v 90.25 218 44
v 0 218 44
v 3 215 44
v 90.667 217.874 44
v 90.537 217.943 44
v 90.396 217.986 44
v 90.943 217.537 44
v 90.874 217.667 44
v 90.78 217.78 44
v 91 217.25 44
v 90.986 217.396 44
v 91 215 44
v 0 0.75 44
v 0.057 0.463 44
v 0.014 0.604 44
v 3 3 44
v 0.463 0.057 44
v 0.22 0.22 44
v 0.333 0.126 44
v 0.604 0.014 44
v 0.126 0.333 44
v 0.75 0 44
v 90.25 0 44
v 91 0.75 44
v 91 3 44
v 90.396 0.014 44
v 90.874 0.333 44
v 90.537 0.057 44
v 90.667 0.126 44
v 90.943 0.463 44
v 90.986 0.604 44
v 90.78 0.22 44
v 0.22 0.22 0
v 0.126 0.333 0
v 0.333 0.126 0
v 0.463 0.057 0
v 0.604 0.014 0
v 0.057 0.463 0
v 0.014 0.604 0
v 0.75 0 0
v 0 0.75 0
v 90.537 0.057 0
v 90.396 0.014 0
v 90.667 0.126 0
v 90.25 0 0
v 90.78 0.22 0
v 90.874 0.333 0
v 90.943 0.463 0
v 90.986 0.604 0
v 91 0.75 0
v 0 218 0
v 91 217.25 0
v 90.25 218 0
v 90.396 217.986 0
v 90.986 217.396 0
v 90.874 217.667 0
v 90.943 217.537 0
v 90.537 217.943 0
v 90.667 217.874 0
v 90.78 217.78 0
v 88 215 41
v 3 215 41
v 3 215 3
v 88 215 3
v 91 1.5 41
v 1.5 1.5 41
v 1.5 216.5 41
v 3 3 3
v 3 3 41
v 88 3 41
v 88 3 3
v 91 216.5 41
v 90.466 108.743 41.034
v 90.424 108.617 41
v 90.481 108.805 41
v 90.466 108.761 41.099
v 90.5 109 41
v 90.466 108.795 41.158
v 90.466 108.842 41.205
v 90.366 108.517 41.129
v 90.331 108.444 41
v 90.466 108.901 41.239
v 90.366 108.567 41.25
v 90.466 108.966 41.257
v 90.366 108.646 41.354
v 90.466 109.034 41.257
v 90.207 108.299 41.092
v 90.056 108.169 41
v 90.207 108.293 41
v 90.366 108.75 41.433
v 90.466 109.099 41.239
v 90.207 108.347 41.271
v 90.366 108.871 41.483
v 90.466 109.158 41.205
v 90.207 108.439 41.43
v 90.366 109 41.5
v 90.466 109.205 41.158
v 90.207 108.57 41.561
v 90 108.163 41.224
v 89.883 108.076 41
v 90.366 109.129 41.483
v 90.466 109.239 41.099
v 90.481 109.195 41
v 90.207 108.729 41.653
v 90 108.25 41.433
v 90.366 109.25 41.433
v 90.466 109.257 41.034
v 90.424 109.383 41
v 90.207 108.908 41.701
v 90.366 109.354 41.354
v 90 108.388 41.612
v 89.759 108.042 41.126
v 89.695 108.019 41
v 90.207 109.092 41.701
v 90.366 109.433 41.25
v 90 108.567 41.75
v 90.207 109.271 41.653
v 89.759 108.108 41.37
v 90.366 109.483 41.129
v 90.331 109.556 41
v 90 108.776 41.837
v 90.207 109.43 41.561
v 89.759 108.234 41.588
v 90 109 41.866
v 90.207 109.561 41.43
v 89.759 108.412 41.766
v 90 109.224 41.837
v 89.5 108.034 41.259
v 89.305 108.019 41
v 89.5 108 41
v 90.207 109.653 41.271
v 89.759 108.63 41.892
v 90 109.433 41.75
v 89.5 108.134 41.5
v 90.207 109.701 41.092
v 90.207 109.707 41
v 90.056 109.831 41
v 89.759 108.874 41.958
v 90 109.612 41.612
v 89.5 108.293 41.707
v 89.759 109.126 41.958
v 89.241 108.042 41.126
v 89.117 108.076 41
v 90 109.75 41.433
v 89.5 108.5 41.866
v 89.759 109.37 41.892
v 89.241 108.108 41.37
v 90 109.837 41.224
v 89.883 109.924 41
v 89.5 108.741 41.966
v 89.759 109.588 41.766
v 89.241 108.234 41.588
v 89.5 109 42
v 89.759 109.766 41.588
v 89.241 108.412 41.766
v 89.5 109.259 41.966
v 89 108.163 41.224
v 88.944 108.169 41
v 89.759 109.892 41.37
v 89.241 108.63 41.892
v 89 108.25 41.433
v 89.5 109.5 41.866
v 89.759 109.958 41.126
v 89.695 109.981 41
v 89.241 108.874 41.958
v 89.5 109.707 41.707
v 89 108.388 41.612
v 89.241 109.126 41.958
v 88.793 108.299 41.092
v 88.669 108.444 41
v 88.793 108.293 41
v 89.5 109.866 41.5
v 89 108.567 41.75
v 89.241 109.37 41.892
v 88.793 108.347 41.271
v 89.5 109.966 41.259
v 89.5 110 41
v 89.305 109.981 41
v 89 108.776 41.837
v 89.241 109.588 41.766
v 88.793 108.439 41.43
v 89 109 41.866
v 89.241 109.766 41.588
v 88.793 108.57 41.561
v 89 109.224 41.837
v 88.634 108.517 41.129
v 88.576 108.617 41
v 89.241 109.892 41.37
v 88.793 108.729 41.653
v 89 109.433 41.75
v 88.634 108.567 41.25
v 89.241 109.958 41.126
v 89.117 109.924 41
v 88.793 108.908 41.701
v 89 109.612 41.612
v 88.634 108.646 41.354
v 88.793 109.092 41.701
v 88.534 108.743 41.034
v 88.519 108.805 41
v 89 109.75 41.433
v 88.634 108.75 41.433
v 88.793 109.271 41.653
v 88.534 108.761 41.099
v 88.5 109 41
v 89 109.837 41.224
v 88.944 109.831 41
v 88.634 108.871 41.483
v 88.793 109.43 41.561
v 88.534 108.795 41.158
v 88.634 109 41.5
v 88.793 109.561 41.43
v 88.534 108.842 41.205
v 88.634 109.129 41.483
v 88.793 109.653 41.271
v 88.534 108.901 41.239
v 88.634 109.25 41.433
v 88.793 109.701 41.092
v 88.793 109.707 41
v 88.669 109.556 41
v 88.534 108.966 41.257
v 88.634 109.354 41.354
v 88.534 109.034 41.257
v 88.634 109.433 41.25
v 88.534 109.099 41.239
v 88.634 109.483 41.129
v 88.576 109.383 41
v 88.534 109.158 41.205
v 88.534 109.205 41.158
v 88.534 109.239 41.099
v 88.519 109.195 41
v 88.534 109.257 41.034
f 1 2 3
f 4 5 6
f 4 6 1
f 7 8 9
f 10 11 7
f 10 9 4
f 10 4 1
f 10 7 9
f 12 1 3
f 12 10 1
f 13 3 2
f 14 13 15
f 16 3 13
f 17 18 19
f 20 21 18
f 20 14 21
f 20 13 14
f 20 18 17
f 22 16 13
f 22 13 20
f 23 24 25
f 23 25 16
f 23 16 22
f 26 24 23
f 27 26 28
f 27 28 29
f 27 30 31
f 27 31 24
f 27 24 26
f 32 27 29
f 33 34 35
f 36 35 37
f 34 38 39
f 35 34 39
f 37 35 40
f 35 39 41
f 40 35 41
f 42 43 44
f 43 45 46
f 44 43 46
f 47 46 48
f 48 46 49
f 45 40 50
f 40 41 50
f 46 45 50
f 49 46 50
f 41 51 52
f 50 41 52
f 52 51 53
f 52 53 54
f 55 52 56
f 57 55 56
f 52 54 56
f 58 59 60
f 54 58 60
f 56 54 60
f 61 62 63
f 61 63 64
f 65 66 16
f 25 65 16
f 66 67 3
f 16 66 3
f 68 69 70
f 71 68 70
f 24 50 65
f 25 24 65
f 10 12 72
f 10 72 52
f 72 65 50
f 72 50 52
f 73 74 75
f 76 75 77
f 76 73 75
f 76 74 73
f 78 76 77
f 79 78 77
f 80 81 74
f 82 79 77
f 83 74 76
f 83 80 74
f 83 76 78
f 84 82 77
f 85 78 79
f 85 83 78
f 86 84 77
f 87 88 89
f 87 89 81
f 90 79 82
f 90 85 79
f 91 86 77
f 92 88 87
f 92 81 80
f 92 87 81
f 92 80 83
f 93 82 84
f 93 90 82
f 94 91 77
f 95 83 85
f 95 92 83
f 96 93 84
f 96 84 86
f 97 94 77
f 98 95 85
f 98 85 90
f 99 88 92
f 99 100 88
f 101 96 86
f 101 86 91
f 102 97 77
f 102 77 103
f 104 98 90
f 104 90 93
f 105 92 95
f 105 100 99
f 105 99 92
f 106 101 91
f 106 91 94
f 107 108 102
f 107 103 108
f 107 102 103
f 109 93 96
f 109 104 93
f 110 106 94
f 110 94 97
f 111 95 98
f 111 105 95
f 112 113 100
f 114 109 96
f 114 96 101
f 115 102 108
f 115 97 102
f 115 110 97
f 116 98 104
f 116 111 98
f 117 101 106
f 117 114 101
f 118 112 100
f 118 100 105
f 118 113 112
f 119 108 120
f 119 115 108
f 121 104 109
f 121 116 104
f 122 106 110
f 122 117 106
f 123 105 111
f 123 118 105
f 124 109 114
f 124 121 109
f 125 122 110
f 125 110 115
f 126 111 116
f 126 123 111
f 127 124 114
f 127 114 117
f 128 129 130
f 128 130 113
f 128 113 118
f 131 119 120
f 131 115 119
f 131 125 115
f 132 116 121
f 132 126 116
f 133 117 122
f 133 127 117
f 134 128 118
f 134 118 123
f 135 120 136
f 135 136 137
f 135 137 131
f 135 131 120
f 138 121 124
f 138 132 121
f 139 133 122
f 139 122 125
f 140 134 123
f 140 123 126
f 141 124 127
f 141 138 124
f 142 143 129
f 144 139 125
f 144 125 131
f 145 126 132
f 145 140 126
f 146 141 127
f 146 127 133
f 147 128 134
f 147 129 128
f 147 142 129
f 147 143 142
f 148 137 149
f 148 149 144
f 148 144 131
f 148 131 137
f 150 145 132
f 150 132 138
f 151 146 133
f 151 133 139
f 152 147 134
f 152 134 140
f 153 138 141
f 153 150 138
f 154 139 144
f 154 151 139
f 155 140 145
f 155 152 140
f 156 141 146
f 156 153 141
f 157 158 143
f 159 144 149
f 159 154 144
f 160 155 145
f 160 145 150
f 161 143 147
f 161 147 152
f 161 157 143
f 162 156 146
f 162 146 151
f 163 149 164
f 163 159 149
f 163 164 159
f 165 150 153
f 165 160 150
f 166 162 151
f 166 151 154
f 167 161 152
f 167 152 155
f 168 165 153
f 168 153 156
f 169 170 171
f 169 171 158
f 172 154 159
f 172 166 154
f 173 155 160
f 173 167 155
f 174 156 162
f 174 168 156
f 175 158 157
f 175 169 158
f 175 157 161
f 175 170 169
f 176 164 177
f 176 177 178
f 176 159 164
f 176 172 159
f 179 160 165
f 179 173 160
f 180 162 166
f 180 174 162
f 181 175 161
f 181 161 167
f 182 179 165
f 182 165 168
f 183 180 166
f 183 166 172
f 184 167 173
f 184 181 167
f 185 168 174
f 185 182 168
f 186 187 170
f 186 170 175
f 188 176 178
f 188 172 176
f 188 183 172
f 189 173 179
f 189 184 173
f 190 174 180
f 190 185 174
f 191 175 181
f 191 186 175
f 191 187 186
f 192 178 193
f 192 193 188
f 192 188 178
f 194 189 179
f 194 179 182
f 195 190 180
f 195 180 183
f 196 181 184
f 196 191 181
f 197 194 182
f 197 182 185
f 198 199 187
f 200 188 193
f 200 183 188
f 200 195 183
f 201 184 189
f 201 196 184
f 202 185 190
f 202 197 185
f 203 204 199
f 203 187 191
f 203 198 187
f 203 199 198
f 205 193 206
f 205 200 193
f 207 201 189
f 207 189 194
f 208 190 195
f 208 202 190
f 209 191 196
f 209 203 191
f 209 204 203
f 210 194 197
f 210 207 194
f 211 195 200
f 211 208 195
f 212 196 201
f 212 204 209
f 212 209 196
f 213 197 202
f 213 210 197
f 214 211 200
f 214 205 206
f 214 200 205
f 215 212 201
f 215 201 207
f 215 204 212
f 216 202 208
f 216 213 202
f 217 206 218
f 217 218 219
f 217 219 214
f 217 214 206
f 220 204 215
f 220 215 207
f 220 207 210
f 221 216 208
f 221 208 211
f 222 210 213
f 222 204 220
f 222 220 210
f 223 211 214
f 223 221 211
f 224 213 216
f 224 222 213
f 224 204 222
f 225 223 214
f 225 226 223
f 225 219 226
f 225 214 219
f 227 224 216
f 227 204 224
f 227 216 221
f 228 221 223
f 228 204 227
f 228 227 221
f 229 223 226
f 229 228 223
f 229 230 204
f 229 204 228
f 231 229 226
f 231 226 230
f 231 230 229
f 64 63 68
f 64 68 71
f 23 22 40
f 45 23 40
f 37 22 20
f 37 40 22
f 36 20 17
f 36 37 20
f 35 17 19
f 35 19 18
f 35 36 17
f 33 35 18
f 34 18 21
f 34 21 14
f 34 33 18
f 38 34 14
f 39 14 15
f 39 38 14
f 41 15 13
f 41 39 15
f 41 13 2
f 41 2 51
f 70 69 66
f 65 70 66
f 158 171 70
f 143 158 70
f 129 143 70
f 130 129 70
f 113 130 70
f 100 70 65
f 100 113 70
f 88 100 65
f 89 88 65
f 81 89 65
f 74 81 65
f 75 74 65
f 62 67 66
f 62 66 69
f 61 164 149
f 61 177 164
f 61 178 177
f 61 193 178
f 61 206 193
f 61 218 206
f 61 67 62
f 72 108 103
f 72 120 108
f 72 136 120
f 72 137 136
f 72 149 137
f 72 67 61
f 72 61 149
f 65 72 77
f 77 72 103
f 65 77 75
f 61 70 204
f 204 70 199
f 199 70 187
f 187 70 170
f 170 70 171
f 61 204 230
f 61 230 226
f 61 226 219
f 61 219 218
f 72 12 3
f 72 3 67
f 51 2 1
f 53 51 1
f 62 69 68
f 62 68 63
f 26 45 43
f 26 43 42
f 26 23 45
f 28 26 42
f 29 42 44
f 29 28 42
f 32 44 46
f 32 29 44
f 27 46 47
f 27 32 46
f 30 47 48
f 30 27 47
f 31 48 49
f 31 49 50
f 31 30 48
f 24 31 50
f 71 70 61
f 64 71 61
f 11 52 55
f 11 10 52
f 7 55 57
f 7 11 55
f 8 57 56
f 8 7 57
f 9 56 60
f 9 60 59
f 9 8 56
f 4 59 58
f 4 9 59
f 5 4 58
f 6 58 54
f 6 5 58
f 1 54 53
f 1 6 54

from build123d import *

# Parameters (mm, degrees)
F4_W      = 91
F4_H      = 218
F5_DEPTH  = 41
F8_DEPTH  = 218
F9_DEPTH  = 91
F10_W     = 85
F10_H     = 212
F11_DEPTH = 38
F12_R     = 0.75


with BuildPart() as f5:
    # F4 (on Top) → F5 (new body)
    with BuildSketch(Plane.XY):
        with Locations((45.5, 109)):
            Rectangle(F4_W, F4_H)
    extrude(amount=F5_DEPTH)

    # F7 (on face) → F8 (join)
    with BuildSketch(Plane.XZ):
        Polygon((0, 44), (0, 41), (1.5, 41), (3, 44), align=None)
    extrude(amount=-F8_DEPTH)

    # F6 (on face) → F9 (join)
    with BuildSketch(Plane.YZ.offset(91)):
        Polygon((0, 44), (0, 41), (1.5, 41), (3, 44), align=None)
        Polygon((216.5, 41), (218, 41), (218, 44), (215, 44), align=None)
    extrude(amount=-F9_DEPTH)

    # F10 (on face) → F11 (cut)
    with BuildSketch(Plane.XY.offset(41)):
        with Locations((45.5, 109)):
            Rectangle(F10_W, F10_H)
    extrude(amount=-F11_DEPTH, mode=Mode.SUBTRACT)

    # F12
    f12_edges = [f5.edges().sort_by_distance(p)[0] for p in [
        (91, 0, 22),
        (91, 218, 22),
        (0, 0, 22),
    ]]
    fillet(f12_edges, radius=F12_R)

    # F13 (on face) → F14 (revolve)
    with BuildSketch(Plane.XY.offset(41)):
        with BuildLine():
            Line((88.5, 109), (90.5, 109))
            ThreePointArc((90.5, 109), (89.5, 110), (88.5, 109))
        make_face()
    revolve(axis=Axis((24.0288835471, 109, 41), (-1, 0, 0)))


solid = f5.part
